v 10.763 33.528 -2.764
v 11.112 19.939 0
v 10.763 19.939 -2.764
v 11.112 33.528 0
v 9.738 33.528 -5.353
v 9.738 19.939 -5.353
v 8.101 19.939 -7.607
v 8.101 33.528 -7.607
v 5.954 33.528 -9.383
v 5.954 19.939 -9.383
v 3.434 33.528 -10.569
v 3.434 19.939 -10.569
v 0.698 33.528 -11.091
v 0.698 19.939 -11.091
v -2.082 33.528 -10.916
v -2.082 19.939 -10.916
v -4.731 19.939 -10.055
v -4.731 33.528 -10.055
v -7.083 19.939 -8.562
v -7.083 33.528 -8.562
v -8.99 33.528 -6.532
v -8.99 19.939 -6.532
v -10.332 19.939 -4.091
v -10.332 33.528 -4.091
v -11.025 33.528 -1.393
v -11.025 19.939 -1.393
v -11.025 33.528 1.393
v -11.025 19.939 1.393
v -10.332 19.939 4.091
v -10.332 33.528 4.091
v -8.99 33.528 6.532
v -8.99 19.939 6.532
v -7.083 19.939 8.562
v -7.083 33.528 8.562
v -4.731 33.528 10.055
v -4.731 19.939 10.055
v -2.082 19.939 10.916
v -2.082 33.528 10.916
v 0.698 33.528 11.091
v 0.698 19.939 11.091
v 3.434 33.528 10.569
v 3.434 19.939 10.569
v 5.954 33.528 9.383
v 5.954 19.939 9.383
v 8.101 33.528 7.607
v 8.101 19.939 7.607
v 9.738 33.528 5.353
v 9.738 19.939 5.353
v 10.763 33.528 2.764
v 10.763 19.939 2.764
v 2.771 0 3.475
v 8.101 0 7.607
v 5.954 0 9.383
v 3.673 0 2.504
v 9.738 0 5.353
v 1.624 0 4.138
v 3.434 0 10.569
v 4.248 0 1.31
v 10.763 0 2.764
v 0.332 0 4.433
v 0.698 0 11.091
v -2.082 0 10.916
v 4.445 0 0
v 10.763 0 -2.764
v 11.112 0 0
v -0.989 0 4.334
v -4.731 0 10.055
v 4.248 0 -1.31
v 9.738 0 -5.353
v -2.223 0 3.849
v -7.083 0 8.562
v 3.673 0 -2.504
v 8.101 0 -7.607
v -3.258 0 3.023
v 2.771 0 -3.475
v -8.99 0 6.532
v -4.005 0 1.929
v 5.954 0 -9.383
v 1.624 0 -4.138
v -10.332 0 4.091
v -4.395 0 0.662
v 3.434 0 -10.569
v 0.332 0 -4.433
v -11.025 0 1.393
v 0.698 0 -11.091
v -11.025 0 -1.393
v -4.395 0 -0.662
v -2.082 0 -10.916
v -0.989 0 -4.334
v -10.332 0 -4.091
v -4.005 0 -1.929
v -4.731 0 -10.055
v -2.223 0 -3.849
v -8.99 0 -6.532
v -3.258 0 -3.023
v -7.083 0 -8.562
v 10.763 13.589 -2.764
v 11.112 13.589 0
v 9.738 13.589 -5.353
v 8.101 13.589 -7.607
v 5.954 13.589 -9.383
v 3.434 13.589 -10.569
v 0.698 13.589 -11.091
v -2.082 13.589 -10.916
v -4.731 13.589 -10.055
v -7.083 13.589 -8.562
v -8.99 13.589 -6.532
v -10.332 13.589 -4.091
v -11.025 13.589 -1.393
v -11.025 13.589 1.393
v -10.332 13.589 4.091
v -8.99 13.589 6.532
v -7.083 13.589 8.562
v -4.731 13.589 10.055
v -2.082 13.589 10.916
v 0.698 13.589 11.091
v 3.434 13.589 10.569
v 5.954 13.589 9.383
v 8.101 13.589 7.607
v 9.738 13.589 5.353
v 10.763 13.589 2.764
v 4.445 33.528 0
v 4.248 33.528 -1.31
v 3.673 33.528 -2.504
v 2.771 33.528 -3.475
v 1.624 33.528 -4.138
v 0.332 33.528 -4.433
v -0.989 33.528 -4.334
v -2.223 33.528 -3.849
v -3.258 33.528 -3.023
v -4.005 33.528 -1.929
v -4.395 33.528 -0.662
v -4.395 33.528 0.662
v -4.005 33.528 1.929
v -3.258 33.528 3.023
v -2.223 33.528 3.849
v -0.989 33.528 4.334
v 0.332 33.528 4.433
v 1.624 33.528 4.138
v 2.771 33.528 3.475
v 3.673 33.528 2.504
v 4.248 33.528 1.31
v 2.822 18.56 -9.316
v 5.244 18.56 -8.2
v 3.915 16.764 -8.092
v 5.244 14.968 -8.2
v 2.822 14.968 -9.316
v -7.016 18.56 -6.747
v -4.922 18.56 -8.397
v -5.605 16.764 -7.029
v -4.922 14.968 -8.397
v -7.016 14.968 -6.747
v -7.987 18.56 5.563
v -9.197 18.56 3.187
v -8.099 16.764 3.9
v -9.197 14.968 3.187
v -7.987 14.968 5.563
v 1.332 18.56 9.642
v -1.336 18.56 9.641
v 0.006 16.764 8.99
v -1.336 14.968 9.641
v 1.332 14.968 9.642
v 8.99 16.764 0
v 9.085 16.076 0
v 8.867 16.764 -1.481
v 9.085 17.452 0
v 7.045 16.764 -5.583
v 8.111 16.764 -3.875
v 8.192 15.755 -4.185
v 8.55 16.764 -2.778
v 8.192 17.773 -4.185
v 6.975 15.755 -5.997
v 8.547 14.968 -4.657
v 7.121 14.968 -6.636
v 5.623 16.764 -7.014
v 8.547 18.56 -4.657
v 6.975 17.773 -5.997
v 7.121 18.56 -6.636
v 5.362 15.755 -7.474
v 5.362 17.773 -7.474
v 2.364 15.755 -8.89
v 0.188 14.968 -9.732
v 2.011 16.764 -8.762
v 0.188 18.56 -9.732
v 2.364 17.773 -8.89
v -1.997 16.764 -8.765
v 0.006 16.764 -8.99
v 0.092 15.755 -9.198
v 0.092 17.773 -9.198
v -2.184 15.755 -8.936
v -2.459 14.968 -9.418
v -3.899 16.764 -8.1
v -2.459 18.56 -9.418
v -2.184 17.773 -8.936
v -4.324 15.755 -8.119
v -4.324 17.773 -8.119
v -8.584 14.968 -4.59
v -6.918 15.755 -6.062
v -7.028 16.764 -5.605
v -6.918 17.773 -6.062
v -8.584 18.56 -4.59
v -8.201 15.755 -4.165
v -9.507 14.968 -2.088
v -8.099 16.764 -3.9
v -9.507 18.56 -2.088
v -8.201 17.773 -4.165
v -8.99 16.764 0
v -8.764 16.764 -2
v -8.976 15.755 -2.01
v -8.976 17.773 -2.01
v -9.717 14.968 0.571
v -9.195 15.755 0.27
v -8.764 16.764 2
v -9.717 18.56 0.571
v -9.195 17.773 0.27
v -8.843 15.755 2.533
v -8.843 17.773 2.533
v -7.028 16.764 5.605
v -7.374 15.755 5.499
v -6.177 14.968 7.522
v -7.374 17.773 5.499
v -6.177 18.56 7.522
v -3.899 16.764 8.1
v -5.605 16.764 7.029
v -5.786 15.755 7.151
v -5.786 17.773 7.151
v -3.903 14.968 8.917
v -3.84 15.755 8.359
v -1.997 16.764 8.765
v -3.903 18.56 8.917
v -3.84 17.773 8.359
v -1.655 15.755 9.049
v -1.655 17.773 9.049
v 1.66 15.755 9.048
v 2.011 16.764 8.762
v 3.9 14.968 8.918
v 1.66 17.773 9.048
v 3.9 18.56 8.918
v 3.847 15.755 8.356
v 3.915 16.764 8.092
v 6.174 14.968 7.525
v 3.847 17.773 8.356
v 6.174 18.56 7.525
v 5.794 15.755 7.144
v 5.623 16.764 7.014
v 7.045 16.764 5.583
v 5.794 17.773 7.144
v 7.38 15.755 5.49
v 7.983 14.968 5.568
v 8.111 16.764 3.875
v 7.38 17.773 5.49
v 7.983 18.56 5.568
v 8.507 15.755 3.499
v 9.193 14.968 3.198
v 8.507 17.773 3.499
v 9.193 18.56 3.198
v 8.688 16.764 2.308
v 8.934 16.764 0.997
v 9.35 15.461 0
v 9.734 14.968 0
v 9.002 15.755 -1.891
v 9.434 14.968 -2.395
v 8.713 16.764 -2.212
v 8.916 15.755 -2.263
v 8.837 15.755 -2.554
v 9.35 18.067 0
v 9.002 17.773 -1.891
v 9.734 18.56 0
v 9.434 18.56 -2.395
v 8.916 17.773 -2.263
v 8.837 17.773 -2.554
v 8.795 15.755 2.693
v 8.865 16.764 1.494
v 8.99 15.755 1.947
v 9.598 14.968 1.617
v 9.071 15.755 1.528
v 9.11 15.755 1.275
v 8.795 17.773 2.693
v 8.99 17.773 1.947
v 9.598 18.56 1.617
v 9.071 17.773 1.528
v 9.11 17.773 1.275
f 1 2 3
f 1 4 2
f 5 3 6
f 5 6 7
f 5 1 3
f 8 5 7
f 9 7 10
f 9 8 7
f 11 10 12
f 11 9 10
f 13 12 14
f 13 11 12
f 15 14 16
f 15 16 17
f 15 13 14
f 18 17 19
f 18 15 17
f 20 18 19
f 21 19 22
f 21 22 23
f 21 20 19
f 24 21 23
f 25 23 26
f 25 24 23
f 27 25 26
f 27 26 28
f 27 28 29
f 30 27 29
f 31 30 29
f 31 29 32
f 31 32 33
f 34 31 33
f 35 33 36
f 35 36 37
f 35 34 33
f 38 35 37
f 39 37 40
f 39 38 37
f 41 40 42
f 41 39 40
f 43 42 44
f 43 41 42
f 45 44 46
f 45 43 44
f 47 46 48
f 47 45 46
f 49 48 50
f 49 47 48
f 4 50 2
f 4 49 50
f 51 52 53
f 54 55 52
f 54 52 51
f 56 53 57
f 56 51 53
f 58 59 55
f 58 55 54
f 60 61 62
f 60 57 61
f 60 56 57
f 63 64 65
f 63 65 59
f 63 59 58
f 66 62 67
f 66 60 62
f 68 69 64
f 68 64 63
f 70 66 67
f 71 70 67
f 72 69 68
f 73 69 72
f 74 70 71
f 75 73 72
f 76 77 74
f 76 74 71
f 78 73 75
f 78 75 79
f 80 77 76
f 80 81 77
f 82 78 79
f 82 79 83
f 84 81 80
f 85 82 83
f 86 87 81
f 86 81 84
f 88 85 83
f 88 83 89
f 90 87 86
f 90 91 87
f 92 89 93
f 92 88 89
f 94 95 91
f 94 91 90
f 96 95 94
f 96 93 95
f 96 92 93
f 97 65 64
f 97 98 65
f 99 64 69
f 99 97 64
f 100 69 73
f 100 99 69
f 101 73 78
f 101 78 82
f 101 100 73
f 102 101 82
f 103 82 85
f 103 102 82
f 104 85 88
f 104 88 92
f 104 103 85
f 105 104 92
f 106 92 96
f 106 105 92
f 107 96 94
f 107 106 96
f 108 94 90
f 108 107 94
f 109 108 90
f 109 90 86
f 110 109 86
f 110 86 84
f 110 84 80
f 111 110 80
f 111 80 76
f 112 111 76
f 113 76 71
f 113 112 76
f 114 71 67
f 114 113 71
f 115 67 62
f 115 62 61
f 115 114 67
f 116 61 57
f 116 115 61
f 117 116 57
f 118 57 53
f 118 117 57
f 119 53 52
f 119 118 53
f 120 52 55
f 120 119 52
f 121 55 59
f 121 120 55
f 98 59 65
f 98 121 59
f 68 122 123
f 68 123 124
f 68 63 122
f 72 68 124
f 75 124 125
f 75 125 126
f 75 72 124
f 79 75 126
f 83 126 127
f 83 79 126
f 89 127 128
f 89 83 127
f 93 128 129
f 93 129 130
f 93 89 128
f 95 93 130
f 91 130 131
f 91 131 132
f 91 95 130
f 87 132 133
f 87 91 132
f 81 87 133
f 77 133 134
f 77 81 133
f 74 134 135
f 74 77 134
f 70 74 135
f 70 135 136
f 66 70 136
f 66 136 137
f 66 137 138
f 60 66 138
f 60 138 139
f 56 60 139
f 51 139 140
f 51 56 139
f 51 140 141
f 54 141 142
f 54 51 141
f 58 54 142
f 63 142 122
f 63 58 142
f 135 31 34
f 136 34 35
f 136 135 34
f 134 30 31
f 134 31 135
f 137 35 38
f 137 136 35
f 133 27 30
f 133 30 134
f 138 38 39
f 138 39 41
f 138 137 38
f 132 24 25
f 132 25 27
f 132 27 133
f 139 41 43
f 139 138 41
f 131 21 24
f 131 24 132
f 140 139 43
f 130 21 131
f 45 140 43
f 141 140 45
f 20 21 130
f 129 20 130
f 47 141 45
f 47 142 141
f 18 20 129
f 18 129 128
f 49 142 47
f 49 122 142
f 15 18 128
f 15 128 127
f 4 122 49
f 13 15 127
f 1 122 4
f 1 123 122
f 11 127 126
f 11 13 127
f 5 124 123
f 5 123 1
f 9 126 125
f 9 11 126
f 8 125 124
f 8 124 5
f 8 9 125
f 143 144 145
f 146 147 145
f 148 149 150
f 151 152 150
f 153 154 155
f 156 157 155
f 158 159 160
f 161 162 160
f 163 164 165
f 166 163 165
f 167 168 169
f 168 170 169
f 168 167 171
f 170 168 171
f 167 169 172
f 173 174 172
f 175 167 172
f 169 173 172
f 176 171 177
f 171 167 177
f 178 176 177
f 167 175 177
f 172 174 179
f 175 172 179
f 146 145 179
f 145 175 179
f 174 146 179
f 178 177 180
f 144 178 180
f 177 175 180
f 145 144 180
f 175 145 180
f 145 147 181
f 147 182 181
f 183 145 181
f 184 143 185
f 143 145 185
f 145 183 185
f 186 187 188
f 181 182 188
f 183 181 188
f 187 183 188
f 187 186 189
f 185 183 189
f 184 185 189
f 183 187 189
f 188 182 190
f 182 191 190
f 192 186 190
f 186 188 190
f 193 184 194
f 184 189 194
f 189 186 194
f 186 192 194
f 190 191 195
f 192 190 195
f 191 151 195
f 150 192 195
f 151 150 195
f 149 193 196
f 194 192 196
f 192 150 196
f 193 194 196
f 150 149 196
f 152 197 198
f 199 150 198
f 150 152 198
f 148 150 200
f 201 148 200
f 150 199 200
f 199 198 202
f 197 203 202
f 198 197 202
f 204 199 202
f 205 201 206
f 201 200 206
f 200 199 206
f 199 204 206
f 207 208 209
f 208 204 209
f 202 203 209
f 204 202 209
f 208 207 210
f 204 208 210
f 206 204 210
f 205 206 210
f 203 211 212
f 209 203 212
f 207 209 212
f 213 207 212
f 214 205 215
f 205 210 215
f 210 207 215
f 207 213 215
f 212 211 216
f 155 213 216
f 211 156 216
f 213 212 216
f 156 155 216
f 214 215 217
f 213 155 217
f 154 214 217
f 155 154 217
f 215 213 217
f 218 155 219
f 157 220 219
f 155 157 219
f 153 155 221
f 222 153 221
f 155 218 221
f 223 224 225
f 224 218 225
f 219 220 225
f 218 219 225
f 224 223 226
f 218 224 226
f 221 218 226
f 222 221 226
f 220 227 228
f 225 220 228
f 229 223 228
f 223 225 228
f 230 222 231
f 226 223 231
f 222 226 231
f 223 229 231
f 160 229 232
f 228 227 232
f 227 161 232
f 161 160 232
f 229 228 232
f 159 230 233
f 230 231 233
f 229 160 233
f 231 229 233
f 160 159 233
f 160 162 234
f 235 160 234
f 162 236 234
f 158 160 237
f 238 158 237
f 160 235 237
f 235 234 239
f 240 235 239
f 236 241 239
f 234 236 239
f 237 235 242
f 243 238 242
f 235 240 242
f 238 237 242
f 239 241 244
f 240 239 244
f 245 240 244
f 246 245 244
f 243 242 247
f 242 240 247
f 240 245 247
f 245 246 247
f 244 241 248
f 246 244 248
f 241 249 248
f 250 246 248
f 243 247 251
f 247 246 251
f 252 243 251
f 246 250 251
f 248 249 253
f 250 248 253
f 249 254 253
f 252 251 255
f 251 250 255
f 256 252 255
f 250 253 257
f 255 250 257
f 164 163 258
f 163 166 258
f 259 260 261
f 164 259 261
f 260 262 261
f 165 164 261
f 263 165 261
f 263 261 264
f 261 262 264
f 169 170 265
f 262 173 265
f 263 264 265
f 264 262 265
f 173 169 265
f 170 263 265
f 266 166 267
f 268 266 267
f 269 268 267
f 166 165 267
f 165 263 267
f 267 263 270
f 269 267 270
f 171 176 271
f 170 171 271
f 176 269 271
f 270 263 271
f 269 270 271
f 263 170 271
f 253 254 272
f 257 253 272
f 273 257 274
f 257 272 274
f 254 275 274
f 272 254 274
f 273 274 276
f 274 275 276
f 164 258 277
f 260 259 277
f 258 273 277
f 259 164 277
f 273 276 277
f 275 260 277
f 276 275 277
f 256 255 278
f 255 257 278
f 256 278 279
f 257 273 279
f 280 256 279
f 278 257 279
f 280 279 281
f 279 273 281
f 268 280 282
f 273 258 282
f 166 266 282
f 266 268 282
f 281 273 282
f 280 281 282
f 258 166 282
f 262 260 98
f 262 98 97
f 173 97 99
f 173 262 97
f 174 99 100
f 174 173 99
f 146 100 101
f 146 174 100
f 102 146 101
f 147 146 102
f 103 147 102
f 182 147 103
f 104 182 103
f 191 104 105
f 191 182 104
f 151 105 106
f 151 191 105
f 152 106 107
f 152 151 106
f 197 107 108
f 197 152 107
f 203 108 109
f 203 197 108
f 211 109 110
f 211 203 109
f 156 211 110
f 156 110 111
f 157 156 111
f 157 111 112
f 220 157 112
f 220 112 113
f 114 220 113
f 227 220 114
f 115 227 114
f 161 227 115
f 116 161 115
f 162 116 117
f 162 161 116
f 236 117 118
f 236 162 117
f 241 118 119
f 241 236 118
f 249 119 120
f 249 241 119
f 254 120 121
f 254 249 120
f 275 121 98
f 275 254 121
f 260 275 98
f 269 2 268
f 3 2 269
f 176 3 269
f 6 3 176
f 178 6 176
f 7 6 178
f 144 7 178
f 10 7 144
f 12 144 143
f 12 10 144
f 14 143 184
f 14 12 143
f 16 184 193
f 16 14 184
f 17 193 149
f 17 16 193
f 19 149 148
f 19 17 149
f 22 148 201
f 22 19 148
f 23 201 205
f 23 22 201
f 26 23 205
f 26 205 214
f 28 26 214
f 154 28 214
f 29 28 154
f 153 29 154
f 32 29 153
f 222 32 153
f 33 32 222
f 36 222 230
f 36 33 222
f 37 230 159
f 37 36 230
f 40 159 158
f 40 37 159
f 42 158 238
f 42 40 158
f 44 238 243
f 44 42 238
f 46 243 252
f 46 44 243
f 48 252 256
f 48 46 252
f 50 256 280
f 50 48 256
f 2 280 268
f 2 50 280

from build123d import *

# Parameters (mm, degrees)
FILLET1_R = 2.54


with BuildPart() as part:
    # Sketch2 → Revolve1 (revolve)
    with BuildSketch(Plane.XY):
        Polygon((4.445, 0), (11.1125, 0), (11.1125, 13.589), (7.9375, 16.764), (11.1125, 19.939), (11.1125, 33.528), (4.445, 33.528), align=None)
    revolve(axis=Axis((0, 0, 0), (0, 1, 0)))

    # Fillet1
    fillet1_edges = [part.edges().sort_by_distance(p)[0] for p in [
        (-7.9375, 16.764, 0),
    ]]
    fillet(fillet1_edges, radius=FILLET1_R)


solid = part.part
